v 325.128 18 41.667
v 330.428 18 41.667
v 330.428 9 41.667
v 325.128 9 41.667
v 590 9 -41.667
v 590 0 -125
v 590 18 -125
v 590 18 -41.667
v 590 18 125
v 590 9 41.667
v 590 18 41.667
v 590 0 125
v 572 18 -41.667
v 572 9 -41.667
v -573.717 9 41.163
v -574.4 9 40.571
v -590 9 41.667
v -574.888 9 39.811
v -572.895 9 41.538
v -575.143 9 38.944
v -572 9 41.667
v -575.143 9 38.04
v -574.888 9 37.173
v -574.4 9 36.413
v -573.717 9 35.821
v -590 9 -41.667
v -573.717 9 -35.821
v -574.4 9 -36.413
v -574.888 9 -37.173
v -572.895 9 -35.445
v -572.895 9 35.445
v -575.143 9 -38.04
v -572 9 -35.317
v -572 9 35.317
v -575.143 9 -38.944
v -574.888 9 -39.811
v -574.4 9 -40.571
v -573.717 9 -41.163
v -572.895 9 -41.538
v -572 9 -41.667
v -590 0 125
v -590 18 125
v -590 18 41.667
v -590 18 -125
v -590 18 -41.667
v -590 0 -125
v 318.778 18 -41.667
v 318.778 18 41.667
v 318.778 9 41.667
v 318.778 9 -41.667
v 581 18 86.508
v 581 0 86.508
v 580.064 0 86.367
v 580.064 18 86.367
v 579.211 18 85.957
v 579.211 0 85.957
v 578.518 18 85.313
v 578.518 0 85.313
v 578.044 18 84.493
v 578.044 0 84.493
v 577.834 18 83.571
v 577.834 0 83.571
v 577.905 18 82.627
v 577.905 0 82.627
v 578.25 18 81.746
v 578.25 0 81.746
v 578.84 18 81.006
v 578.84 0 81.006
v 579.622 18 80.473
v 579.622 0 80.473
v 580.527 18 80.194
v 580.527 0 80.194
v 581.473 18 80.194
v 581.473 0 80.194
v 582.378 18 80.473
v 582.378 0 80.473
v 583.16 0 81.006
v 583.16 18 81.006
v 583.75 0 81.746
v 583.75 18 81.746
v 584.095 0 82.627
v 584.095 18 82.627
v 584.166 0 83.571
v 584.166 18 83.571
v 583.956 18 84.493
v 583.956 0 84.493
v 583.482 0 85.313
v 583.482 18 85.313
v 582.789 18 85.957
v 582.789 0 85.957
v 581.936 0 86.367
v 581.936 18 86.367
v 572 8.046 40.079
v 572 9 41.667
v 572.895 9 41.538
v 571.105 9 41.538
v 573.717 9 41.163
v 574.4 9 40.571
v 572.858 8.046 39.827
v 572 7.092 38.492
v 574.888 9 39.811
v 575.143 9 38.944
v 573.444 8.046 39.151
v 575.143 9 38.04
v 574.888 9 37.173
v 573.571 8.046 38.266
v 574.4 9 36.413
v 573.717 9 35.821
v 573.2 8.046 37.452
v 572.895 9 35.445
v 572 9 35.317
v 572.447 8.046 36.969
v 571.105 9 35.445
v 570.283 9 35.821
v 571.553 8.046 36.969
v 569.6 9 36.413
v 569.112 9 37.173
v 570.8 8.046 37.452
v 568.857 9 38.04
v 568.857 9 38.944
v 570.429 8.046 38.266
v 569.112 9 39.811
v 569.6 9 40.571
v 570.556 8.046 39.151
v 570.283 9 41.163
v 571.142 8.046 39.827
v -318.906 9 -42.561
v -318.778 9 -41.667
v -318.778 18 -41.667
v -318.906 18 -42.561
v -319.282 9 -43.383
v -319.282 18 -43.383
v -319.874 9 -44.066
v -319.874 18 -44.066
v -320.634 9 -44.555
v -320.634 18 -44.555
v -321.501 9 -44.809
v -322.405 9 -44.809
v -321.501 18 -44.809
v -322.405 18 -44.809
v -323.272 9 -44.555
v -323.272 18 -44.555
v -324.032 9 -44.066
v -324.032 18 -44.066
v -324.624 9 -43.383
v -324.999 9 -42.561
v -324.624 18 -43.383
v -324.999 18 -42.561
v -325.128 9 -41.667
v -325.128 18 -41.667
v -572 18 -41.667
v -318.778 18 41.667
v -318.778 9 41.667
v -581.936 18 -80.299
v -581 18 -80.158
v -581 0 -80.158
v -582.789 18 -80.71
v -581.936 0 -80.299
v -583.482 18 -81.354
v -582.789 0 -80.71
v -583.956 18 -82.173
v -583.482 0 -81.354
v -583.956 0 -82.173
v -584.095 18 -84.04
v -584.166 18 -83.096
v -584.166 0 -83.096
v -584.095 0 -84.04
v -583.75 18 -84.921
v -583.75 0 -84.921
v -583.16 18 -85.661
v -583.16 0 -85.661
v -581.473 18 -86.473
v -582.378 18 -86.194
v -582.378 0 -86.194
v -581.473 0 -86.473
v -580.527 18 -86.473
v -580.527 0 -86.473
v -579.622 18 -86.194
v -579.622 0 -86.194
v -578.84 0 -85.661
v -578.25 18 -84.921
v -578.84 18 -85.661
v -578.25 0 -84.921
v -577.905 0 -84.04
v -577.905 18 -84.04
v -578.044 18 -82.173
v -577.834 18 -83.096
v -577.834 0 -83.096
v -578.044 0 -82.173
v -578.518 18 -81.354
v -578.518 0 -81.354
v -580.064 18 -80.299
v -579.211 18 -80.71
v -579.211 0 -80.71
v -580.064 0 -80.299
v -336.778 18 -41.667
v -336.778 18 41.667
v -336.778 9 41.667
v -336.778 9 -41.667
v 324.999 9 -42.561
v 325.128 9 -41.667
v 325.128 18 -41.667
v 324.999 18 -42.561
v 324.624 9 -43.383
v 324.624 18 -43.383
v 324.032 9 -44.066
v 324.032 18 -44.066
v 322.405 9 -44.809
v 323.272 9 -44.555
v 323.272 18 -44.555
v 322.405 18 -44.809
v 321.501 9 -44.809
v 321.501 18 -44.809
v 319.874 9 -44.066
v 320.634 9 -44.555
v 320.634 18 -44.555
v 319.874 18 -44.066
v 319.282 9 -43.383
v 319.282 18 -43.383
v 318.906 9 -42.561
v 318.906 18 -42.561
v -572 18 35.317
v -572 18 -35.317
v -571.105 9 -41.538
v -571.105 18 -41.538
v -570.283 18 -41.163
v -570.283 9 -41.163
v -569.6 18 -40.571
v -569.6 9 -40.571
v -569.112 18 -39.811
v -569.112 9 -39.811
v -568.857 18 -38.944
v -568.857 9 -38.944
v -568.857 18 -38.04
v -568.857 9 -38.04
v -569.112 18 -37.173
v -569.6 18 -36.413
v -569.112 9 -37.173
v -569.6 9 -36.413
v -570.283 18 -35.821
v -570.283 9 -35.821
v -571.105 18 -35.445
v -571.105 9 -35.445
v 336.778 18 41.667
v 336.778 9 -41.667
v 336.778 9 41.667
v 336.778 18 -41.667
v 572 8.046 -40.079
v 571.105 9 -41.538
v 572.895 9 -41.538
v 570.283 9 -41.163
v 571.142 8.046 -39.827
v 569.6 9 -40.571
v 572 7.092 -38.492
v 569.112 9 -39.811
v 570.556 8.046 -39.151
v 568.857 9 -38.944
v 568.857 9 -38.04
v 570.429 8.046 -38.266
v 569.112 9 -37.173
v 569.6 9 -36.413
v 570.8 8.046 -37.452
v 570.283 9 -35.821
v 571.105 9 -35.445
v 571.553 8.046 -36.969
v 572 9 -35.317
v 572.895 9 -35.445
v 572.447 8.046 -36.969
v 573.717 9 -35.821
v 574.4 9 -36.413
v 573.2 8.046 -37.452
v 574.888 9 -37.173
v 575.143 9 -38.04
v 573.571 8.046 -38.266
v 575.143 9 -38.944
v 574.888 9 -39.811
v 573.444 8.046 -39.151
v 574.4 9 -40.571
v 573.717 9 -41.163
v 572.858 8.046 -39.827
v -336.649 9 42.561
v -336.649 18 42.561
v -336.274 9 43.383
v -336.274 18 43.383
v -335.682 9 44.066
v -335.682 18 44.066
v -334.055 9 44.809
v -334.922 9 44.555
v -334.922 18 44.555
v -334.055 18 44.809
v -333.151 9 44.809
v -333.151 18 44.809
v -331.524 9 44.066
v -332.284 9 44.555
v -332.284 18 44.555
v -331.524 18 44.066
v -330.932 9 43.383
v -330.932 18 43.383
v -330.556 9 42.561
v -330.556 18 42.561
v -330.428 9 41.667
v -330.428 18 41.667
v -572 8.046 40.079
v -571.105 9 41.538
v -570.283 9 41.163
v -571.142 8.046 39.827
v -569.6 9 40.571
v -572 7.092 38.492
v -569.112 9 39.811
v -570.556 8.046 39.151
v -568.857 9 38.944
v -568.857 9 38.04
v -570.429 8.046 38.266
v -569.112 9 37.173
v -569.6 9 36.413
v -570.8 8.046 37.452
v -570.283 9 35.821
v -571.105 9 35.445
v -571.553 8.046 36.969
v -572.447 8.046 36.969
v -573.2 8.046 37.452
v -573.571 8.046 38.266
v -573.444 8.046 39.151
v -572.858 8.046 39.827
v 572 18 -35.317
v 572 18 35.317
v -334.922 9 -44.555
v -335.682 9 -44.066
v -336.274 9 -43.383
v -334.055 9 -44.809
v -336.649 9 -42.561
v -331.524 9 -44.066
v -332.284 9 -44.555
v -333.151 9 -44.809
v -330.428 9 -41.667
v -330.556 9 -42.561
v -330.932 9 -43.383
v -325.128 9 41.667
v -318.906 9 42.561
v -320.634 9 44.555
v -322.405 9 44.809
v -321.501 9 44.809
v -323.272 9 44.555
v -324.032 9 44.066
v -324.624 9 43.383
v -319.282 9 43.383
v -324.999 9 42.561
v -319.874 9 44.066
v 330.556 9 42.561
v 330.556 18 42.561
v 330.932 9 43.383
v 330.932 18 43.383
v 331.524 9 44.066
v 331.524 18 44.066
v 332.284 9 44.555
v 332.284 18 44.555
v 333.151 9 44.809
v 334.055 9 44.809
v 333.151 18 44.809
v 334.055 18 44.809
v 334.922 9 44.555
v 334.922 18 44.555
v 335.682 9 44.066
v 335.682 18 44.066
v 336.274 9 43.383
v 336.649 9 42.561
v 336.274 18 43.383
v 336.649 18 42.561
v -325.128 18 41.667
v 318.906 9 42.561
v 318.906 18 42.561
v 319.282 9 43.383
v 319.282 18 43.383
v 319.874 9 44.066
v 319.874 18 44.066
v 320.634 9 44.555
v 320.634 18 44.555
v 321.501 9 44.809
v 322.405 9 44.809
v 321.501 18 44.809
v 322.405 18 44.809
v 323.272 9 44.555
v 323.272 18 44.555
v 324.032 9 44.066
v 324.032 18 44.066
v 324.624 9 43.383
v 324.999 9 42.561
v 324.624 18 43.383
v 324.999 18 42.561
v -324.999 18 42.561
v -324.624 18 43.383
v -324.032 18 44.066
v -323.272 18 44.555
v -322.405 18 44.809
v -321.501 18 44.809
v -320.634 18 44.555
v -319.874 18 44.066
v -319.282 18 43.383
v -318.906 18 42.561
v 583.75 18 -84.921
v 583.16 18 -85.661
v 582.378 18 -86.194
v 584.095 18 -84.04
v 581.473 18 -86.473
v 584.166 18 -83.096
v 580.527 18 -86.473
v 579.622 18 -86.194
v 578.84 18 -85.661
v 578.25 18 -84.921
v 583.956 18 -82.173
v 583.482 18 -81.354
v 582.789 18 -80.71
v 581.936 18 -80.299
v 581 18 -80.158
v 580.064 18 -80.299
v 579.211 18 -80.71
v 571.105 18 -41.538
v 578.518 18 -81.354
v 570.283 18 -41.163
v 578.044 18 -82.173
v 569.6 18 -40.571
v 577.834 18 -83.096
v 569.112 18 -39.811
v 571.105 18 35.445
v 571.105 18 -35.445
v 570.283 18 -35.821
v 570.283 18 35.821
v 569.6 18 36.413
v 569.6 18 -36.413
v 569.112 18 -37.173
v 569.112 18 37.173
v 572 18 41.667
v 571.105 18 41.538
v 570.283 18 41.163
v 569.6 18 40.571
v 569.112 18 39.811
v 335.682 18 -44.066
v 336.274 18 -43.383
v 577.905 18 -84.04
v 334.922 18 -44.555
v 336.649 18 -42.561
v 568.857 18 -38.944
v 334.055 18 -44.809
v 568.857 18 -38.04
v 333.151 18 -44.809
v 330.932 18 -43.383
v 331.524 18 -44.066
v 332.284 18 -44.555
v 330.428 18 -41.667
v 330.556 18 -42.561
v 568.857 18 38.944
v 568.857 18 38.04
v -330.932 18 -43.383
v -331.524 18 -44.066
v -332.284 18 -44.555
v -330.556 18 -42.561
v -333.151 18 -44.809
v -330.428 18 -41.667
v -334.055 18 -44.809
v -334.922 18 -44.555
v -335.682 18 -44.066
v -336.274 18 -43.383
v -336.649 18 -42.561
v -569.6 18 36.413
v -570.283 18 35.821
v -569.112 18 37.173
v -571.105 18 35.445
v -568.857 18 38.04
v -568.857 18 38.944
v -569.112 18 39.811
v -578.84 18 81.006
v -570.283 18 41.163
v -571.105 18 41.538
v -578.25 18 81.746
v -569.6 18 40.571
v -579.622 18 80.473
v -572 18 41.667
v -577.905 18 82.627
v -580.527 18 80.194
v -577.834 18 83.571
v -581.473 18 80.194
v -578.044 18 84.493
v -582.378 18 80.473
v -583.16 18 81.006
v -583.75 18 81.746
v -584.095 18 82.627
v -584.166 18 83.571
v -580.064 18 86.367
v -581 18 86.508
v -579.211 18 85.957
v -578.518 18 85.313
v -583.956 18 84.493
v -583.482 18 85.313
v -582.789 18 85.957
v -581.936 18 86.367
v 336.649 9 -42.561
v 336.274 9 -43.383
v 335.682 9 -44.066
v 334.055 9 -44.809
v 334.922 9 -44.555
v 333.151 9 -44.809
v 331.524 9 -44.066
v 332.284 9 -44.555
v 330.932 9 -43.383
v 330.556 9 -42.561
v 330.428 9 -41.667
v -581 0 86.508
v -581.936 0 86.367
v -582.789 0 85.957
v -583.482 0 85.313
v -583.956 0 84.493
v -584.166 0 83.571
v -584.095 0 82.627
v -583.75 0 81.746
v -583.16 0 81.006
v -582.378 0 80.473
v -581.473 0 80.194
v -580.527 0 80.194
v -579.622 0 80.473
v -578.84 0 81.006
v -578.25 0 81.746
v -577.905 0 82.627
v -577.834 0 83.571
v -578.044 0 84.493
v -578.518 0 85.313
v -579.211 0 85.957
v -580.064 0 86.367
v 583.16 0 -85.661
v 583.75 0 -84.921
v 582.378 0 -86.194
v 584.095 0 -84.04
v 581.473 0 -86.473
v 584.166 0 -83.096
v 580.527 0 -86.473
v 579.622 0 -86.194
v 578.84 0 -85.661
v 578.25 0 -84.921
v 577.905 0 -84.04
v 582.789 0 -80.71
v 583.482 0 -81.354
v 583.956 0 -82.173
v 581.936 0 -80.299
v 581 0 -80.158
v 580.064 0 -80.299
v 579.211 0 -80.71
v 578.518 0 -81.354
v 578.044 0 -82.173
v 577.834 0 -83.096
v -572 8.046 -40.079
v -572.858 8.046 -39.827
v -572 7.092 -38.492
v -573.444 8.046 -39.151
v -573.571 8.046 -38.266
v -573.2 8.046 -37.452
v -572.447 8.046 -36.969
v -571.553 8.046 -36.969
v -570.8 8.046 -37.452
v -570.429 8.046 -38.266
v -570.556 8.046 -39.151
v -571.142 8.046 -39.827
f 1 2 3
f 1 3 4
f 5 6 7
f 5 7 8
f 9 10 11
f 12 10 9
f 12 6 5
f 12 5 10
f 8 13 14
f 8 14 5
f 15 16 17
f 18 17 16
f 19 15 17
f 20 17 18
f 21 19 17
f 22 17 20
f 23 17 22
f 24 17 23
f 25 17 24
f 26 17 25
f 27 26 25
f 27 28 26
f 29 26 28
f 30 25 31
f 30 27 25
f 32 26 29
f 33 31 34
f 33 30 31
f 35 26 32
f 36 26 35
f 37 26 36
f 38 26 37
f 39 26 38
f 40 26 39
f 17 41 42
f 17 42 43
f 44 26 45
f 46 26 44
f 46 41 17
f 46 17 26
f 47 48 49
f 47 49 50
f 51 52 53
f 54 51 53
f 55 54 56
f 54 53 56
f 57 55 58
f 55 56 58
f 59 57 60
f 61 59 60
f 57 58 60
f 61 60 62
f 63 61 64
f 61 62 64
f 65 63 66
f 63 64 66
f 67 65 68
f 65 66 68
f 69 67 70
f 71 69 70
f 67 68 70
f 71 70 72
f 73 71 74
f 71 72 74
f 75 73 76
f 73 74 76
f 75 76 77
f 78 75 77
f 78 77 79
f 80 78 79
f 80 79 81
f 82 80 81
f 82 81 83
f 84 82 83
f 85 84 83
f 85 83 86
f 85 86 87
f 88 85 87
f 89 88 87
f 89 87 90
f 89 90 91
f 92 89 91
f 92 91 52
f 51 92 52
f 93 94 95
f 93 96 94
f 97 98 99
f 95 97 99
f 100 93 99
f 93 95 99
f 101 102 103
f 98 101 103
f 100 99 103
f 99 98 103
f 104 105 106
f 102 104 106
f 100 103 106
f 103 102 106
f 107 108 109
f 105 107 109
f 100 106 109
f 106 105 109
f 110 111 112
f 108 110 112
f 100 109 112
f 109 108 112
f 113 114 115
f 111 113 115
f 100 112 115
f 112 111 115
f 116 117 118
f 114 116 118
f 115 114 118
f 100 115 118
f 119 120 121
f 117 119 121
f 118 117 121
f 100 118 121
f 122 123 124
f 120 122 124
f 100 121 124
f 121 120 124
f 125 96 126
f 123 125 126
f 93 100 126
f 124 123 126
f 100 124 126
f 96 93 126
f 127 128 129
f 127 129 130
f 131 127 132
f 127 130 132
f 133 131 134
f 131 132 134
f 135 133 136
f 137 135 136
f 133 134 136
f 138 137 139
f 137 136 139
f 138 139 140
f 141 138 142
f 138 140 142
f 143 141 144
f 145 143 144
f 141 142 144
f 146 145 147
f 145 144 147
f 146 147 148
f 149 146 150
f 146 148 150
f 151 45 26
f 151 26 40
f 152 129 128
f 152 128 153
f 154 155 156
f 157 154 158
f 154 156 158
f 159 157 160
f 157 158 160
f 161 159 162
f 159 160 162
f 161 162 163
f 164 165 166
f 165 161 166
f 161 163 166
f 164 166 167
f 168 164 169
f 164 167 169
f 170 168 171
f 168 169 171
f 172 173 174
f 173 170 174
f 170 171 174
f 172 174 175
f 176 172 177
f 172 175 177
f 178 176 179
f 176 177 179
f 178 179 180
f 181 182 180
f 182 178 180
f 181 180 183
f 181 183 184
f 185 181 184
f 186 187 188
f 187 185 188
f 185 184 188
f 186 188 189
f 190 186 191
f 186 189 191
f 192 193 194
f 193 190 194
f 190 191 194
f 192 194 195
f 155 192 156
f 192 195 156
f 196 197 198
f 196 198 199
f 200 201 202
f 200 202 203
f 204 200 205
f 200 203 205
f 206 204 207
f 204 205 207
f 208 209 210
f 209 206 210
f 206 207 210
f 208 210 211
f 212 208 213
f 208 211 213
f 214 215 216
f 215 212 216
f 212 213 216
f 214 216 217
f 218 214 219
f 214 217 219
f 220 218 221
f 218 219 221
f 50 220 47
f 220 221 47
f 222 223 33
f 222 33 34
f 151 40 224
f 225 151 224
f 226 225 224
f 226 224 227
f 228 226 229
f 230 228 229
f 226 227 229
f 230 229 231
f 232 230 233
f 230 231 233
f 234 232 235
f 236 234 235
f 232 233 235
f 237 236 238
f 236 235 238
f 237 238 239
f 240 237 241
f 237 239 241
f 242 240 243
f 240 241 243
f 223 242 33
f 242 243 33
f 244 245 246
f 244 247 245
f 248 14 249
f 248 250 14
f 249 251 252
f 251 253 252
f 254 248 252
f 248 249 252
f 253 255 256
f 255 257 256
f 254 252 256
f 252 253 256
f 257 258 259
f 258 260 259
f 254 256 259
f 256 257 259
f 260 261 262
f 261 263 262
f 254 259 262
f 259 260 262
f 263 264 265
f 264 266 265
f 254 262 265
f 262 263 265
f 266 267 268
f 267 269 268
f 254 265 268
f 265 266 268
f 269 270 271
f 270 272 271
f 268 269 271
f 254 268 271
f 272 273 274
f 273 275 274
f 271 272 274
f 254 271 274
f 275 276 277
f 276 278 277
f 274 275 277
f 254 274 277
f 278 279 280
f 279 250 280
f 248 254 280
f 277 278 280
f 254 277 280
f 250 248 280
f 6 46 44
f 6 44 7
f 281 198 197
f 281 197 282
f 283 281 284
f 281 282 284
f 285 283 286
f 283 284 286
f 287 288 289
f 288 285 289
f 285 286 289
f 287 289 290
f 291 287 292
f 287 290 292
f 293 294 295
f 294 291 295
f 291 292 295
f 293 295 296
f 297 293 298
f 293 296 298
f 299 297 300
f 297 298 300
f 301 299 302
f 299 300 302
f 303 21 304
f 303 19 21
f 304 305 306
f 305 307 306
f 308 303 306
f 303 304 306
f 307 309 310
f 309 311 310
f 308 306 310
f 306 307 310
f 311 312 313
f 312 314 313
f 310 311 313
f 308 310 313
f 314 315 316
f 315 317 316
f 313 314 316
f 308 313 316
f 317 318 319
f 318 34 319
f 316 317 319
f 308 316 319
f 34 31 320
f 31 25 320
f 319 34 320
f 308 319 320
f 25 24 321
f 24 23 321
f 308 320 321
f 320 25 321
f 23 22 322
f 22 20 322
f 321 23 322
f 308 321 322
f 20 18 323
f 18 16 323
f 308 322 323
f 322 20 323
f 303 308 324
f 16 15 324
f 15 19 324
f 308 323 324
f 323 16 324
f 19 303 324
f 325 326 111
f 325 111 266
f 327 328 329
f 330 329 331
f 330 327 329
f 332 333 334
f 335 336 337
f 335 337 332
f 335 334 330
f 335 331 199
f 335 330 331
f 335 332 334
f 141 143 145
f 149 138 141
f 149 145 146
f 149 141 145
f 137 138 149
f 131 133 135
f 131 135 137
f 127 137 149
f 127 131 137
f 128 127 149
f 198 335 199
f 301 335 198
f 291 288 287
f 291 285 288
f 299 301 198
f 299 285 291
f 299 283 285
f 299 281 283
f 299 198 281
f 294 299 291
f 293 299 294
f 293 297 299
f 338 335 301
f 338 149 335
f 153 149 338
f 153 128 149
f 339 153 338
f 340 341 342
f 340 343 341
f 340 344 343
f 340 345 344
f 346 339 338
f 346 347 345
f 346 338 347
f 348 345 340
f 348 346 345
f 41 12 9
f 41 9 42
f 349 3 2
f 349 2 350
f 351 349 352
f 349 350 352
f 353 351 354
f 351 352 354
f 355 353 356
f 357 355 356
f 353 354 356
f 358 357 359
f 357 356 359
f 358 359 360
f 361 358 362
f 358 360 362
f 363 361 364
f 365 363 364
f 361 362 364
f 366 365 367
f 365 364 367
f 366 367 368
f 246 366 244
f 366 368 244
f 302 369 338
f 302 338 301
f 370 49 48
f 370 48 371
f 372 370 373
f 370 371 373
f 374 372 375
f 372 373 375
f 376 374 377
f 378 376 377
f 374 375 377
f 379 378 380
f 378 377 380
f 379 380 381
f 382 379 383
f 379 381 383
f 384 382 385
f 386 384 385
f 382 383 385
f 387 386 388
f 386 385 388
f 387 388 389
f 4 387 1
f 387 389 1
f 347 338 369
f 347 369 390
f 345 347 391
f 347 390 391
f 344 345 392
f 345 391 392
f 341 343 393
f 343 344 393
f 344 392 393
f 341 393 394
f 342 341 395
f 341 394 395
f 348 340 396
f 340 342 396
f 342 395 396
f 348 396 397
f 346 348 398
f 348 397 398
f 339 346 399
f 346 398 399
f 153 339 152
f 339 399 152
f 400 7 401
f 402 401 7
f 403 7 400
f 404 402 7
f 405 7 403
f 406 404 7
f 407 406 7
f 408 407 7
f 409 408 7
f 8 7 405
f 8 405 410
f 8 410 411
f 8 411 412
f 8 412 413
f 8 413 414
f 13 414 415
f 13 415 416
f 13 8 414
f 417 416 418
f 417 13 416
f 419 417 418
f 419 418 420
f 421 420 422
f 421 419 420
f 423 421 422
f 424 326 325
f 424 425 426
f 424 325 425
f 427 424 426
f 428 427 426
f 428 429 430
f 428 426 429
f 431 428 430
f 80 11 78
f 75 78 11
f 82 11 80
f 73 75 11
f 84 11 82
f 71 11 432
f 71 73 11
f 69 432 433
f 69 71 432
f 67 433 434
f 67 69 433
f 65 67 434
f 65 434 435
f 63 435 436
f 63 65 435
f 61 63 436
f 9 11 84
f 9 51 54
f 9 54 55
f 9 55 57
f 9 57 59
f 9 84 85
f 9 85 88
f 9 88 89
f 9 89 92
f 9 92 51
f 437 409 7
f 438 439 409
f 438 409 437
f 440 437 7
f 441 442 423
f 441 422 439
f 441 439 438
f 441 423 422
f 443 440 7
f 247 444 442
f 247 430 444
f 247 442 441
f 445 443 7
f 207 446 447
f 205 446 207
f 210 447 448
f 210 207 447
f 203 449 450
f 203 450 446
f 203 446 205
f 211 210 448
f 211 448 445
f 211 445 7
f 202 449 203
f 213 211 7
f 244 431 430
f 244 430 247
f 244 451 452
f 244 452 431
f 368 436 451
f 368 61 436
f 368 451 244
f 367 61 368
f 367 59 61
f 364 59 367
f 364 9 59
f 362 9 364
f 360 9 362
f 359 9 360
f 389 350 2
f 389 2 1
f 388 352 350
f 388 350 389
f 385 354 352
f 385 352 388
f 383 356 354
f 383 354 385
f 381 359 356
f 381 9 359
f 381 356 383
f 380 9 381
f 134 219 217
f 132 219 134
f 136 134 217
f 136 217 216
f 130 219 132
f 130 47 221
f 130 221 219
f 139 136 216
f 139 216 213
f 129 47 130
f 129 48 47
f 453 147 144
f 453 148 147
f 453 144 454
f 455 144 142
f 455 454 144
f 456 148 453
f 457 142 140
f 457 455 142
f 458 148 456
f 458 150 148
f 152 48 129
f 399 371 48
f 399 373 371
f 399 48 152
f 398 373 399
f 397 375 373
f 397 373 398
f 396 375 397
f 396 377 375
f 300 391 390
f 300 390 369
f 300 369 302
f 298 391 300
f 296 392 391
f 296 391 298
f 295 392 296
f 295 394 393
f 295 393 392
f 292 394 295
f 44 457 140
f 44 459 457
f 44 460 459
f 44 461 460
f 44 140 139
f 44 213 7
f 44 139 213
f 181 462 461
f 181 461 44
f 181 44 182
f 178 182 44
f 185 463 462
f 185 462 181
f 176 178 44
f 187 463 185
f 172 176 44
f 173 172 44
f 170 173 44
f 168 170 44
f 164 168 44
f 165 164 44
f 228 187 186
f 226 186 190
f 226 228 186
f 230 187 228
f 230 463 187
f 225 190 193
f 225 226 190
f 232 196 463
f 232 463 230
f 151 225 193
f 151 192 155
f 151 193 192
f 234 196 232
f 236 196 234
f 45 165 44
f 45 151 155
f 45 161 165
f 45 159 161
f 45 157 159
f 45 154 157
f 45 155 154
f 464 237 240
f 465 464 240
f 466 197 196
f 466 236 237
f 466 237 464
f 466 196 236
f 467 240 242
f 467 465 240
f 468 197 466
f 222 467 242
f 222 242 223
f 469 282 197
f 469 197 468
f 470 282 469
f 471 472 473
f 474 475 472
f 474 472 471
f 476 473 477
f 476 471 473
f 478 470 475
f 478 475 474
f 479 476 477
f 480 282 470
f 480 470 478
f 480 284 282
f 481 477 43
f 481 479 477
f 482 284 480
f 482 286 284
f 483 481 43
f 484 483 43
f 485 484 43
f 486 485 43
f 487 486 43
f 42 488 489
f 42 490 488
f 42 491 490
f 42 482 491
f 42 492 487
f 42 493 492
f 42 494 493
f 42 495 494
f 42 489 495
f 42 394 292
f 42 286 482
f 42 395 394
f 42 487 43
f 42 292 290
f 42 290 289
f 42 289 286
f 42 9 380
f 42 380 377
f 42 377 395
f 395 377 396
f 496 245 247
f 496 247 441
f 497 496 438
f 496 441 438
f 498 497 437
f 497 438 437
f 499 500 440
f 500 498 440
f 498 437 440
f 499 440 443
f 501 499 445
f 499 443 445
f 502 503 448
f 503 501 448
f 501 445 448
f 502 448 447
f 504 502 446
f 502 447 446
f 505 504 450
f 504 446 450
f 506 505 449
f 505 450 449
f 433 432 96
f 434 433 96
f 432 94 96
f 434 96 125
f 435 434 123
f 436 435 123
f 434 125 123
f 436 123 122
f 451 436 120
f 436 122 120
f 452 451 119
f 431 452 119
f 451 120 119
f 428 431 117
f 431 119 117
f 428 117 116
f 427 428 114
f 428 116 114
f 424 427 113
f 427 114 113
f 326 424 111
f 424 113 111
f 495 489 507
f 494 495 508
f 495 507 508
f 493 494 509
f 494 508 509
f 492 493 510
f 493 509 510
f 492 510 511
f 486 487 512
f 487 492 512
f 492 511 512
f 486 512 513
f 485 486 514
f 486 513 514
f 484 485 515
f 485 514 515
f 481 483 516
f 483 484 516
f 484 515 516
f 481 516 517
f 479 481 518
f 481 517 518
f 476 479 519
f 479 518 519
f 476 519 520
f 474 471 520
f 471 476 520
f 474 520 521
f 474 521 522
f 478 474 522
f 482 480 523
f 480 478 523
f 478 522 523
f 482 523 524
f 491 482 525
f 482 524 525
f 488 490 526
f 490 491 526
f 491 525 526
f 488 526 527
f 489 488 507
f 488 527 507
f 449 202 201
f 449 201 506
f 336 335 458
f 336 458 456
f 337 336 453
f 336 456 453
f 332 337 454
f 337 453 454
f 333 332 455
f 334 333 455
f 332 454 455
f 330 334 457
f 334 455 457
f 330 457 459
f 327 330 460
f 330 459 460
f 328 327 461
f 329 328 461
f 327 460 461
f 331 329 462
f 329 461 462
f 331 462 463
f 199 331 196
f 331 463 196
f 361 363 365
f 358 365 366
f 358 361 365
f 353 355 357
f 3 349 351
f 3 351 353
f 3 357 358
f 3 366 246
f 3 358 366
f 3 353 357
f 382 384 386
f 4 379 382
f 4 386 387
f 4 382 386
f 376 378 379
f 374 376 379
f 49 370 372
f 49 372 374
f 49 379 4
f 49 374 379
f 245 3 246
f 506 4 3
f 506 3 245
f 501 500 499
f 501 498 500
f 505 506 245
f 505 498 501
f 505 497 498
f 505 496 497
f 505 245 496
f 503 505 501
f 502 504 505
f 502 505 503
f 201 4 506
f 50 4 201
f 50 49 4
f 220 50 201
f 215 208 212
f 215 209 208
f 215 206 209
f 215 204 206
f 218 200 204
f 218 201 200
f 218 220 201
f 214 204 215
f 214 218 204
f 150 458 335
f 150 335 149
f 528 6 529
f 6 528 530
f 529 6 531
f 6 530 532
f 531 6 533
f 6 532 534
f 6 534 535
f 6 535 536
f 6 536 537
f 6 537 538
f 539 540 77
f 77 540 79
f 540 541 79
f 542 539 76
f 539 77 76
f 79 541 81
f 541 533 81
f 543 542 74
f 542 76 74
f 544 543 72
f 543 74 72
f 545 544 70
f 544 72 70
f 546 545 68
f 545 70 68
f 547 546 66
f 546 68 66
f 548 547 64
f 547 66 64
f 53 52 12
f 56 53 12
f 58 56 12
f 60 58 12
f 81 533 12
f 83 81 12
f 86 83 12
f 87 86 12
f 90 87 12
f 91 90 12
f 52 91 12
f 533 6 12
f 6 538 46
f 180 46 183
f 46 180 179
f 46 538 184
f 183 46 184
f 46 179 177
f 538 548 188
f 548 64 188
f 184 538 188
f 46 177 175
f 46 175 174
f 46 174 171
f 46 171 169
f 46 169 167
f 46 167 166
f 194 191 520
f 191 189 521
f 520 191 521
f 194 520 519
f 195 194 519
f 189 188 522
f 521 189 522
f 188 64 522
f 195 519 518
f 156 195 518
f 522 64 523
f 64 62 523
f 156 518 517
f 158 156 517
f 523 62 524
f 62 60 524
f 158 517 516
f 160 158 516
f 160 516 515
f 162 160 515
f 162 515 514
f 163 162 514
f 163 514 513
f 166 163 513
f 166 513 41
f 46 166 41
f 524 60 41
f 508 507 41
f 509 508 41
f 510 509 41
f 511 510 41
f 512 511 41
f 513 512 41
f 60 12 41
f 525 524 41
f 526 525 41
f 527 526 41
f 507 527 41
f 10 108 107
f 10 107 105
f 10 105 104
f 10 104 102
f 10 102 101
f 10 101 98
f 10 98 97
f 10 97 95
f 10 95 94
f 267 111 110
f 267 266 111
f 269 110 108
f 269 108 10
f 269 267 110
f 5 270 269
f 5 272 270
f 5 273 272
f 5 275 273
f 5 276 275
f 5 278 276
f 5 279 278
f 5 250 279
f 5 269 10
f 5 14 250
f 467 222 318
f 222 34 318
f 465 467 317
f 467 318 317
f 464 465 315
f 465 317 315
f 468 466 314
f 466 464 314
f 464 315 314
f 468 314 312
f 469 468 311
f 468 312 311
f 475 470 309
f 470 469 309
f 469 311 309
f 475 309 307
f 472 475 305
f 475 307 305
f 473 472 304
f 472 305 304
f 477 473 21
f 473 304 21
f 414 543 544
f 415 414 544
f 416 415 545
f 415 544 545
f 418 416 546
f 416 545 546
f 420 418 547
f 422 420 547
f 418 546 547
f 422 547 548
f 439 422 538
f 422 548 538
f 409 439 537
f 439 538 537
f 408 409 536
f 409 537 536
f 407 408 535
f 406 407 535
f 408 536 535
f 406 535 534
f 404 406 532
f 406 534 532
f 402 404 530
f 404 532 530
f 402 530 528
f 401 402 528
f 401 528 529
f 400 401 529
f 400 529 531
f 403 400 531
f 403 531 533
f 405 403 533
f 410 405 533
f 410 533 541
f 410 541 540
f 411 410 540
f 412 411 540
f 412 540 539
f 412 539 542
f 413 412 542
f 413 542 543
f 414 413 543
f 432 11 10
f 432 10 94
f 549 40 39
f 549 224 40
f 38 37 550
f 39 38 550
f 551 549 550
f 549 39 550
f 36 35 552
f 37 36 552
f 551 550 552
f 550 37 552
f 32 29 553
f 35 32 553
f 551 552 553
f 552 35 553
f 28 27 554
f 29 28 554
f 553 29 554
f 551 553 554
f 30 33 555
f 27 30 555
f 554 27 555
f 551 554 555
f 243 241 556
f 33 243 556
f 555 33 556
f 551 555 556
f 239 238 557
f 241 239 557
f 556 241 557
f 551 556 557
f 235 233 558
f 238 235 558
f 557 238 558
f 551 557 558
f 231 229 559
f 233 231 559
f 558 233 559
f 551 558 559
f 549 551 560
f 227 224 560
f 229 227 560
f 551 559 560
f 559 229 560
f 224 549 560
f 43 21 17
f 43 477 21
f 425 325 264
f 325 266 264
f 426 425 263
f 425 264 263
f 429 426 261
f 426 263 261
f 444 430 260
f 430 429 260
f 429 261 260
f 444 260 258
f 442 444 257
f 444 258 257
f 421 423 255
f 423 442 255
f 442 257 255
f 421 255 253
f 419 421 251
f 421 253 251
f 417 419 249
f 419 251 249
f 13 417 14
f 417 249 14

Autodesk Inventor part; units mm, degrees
ref_plane "YZ Plane" through (0, 0, 0) normal (1, 0, 0) x (0, 1, 0)
sketch "Sketch1" plane through (0, 0, 0) normal (0, 1, 0) x (-1, 0, 0)
  line L0 (590, -125) -> (-590, -125)
  line L1 (-590, -125) -> (-590, 125)
  line L2 (-590, 125) -> (590, 125)
  line L3 (590, 125) -> (590, -125)
  point P0 (0, 0)
  point P1 (0, 125)
  point P2 (-590, 0)
  dimension "d0" = 250
  dimension "d1" = 1180
extrude "Extrusion1" add sketch "Sketch1" along normal blind 18
sketch "Sketch2" plane through (0, 18, 0) normal (0, 1, 0) x (1, 0, 0)
  line L0 (590, 125) -> (-590, 125) projected
  line L1 (-590, 125) -> (-590, -125) projected
  line L2 (-590, -125) -> (590, -125) projected
  line L3 (590, -125) -> (590, 125) projected
  line L4 (-590, 41.6667) -> (-572, 41.6667)
  line L5 (-572, 41.6667) -> (-572, -41.6667)
  line L6 (-572, -41.6667) -> (-590, -41.6667)
  line L7 (-590, -41.6667) -> (-590, 41.6667)
  line L8 (-590, 125) -> (-590, -125) projected
  point P0 (0, 0)
  point P1 (-572, 0)
  point P2 (-590, 0)
  point P3 (-590, 0)
  point P4 (-590, 0)
  dimension "d4" = 18
  dimension "d5" = 83.3333
extrude "Extrusion2" cut sketch "Sketch2" against normal blind 9 contours L4 L5 L6 L1
ref_plane "Work Plane1" through (0, 0, 125) normal (-1, 0, 0) x (0, 0, 1)
mirror "Mirror1" about plane through (0, 0, 125) normal (-1, 0, 0) of "Extrusion2"
sketch "Sketch3" plane through (0, 18, 0) normal (0, 1, 0) x (1, 0, 0)
  line L0 (590, -41.6667) -> (572, -41.6667) projected
  line L1 (572, -41.6667) -> (572, 41.6667) projected
  line L2 (572, 41.6667) -> (590, 41.6667) projected
  line L3 (590, 41.6667) -> (590, 125) projected
  line L4 (590, 125) -> (-590, 125) projected
  line L5 (-590, 125) -> (-590, 41.6667) projected
  line L6 (-590, 41.6667) -> (-572, 41.6667) projected
  line L7 (-572, 41.6667) -> (-572, -41.6667) projected
  line L8 (-572, -41.6667) -> (-590, -41.6667) projected
  line L9 (-590, -41.6667) -> (-590, -125) projected
  line L10 (-590, -125) -> (590, -125) projected
  line L11 (590, -125) -> (590, -41.6667) projected
  line L12 (-336.7778, 41.6667) -> (-318.7778, 41.6667)
  line L13 (-318.7778, 41.6667) -> (-318.7778, -41.6667)
  line L14 (-318.7778, -41.6667) -> (-336.7778, -41.6667)
  line L15 (-336.7778, -41.6667) -> (-336.7778, 41.6667)
  line L16 (-318.7778, 41.6667) -> (-327.7778, 41.6667) construction
  point P0 (0, 0)
  point P1 (-318.7778, 0)
  point P2 (-572, 0)
  point P3 (-323.2778, 41.6667)
  point P4 (-327.7778, 41.6667)
  dimension "d9" = 18
  dimension "d10" = 83.3333
  dimension "d11" = 83.3333
  dimension "d15" = 9
  dimension "d16" = 262.2222
extrude "Extrusion3" cut sketch "Sketch3" against normal blind 9 contours L12 L13 L14 L15
mirror "Mirror2" about plane through (0, 0, 125) normal (-1, 0, 0) of "Extrusion3"
sketch "Sketch4" plane through (0, 18, 0) normal (0, 1, 0) x (1, 0, 0)
  line L0 (336.7778, 41.6667) -> (336.7778, -41.6667) projected
  line L1 (336.7778, -41.6667) -> (318.7778, -41.6667) projected
  line L2 (318.7778, -41.6667) -> (318.7778, 41.6667) projected
  line L3 (318.7778, 41.6667) -> (336.7778, 41.6667) projected
  line L4 (-336.7778, -41.6667) -> (-336.7778, 41.6667) projected
  line L5 (-336.7778, 41.6667) -> (-318.7778, 41.6667) projected
  line L6 (-318.7778, 41.6667) -> (-318.7778, -41.6667) projected
  line L7 (-318.7778, -41.6667) -> (-336.7778, -41.6667) projected
  line L8 (590, -41.6667) -> (572, -41.6667) projected
  line L9 (572, -41.6667) -> (572, 41.6667) projected
  line L10 (572, 41.6667) -> (590, 41.6667) projected
  line L11 (590, 41.6667) -> (590, 125) projected
  line L12 (590, 125) -> (-590, 125) projected
  line L13 (-590, 125) -> (-590, 41.6667) projected
  line L14 (-590, 41.6667) -> (-572, 41.6667) projected
  line L15 (-572, 41.6667) -> (-572, -41.6667) projected
  line L16 (-572, -41.6667) -> (-590, -41.6667) projected
  line L17 (-590, -41.6667) -> (-590, -125) projected
  line L18 (-590, -125) -> (590, -125) projected
  line L19 (590, -125) -> (590, -41.6667) projected
  point P0 (0, 0)
  point P1 (572, -38.4917)
  dimension "d17" = 3.175
hole "Hole1" at (572, 18, 38.4917) direction (0, -1, 0) diameter 6.35 depth 9 tip angle 118
ref_plane "Work Plane2" through (590, 9, 0) normal (0, 0, -1) x (-1, 0, 0)
mirror "Mirror3" about plane through (590, 9, 0) normal (0, 0, -1) of "Hole1"
mirror "Mirror4" about plane through (0, 0, 125) normal (-1, 0, 0) of "Hole1", "Mirror3"
sketch "Sketch5" plane through (318.7778, 9, -41.6667) normal (0, 1, 0) x (1, 0, 0)
  line L0 (18, 0) -> (18, -83.3333) projected
  line L1 (18, -83.3333) -> (0, -83.3333) projected
  line L2 (0, -83.3333) -> (0, 0) projected
  line L3 (0, 0) -> (18, 0) projected
  line L4 (-655.5556, -83.3333) -> (-655.5556, 0) projected
  line L5 (-655.5556, 0) -> (-637.5556, 0) projected
  line L6 (-637.5556, 0) -> (-637.5556, -83.3333) projected
  line L7 (-637.5556, -83.3333) -> (-655.5556, -83.3333) projected
  arc A0 (-890.7778, -6.35) -> (-890.7778, 0) centre (-890.7778, -3.175) ccw projected
  line L8 (-890.7778, -6.35) -> (-890.7778, -76.9833) projected
  arc A1 (-890.7778, -83.3333) -> (-890.7778, -76.9833) centre (-890.7778, -80.1583) ccw projected
  line L9 (-890.7778, -83.3333) -> (-908.7778, -83.3333) projected
  line L10 (-908.7778, -83.3333) -> (-908.7778, -166.6667) projected
  line L11 (-908.7778, -166.6667) -> (271.2222, -166.6667) projected
  line L12 (271.2222, -166.6667) -> (271.2222, -83.3333) projected
  line L13 (271.2222, -83.3333) -> (253.2222, -83.3333) projected
  arc A2 (253.2222, -76.9833) -> (253.2222, -83.3333) centre (253.2222, -80.1583) ccw projected
  line L14 (253.2222, -76.9833) -> (253.2222, -6.35) projected
  arc A3 (253.2222, 0) -> (253.2222, -6.35) centre (253.2222, -3.175) ccw projected
  line L15 (253.2222, 0) -> (271.2222, 0) projected
  line L16 (271.2222, 0) -> (271.2222, 83.3333) projected
  line L17 (271.2222, 83.3333) -> (-908.7778, 83.3333) projected
  line L18 (-908.7778, 83.3333) -> (-908.7778, 0) projected
  line L19 (-908.7778, 0) -> (-890.7778, 0) projected
  point P0 (-318.7778, -41.6667)
  point P1 (14.825, -83.3333)
  point P2 (3.175, -83.3333)
  dimension "d25" = 3.175
  dimension "d26" = 3.175
hole "Hole2" at (333.6028, 9, 41.6667) at (321.9528, 9, 41.6667) direction (0, 1, 0) diameter 6.35 depth 9 tip angle 118
mirror "Mirror5" about plane through (590, 9, 0) normal (0, 0, -1) of "Hole2"
mirror "Mirror6" about plane through (0, 0, 125) normal (-1, 0, 0) of "Hole2", "Mirror5"
sketch "Sketch7" plane through (0, 18, 0) normal (0, 1, 0) x (1, 0, 0)
  arc A0 (336.7778, 41.6667) -> (330.4278, 41.6667) centre (333.6028, 41.6667) ccw projected
  line L0 (336.7778, 41.6667) -> (336.7778, -41.6667) projected
  arc A1 (330.4278, -41.6667) -> (336.7778, -41.6667) centre (333.6028, -41.6667) ccw projected
  line L1 (330.4278, -41.6667) -> (325.1278, -41.6667) projected
  arc A2 (318.7778, -41.6667) -> (325.1278, -41.6667) centre (321.9528, -41.6667) ccw projected
  line L2 (318.7778, -41.6667) -> (318.7778, 41.6667) projected
  arc A3 (325.1278, 41.6667) -> (318.7778, 41.6667) centre (321.9528, 41.6667) ccw projected
  line L3 (325.1278, 41.6667) -> (330.4278, 41.6667) projected
  arc A4 (-572, 35.3167) -> (-572, 41.6667) centre (-572, 38.4917) ccw projected
  line L4 (-572, 35.3167) -> (-572, -35.3167) projected
  arc A5 (-572, -41.6667) -> (-572, -35.3167) centre (-572, -38.4917) ccw projected
  line L5 (-572, -41.6667) -> (-590, -41.6667) projected
  line L6 (-590, -41.6667) -> (-590, -125) projected
  line L7 (-590, -125) -> (590, -125) projected
  line L8 (590, -125) -> (590, -41.6667) projected
  line L9 (590, -41.6667) -> (572, -41.6667) projected
  arc A6 (572, -35.3167) -> (572, -41.6667) centre (572, -38.4917) ccw projected
  line L10 (572, -35.3167) -> (572, 35.3167) projected
  arc A7 (572, 41.6667) -> (572, 35.3167) centre (572, 38.4917) ccw projected
  line L11 (572, 41.6667) -> (590, 41.6667) projected
  line L12 (590, 41.6667) -> (590, 125) projected
  line L13 (590, 125) -> (-590, 125) projected
  line L14 (-590, 125) -> (-590, 41.6667) projected
  line L15 (-590, 41.6667) -> (-572, 41.6667) projected
  arc A8 (-330.4278, 41.6667) -> (-336.7778, 41.6667) centre (-333.6028, 41.6667) ccw projected
  line L16 (-330.4278, 41.6667) -> (-325.1278, 41.6667) projected
  arc A9 (-318.7778, 41.6667) -> (-325.1278, 41.6667) centre (-321.9528, 41.6667) ccw projected
  line L17 (-318.7778, 41.6667) -> (-318.7778, -41.6667) projected
  arc A10 (-325.1278, -41.6667) -> (-318.7778, -41.6667) centre (-321.9528, -41.6667) ccw projected
  line L18 (-325.1278, -41.6667) -> (-330.4278, -41.6667) projected
  arc A11 (-336.7778, -41.6667) -> (-330.4278, -41.6667) centre (-333.6028, -41.6667) ccw projected
  line L19 (-336.7778, -41.6667) -> (-336.7778, 41.6667) projected
  point P0 (0, 0)
  point P1 (581, -83.3333)
  point P2 (581, 83.3333)
  point P3 (590, 83.3333)
  point P4 (590, -83.3333)
  dimension "d34" = 9
  dimension "d35" = 9
hole "Hole3" at (581, 18, 83.3333) at (581, 18, -83.3333) direction (0, -1, 0) diameter 6.35 end through all
mirror "Mirror7" about plane through (0, 0, 125) normal (-1, 0, 0) of "Hole3"
equation "\"d0\" = shelfWidth"
equation "\"d1\" = shelfLength"
equation "\"d2\" = plyThickness"
equation "\"d4\" = plyThickness"
equation "\"d5\" = 0.333333 * shelfWidth"
equation "\"d7\" = 0.5 * plyThickness"
equation "\"d9\" = plyThickness"
equation "\"d10\" = 0.333333 * shelfWidth"
equation "\"d15\" = 0.5 * plyThickness"
equation "\"d16\" = 0.222222 * shelfLength"
equation "\"d13\" = 0.5 * plyThickness"
equation "\"d17\" = 0.5 * millDiameter"
equation "\"d18\" = millDiameter"
equation "\"d23\" = 0.5 * plyThickness"
equation "\"d25\" = 0.5 * millDiameter"
equation "\"d26\" = 0.5 * millDiameter"
equation "\"d27\" = millDiameter"
equation "\"d32\" = 0.5 * plyThickness"
equation "\"d34\" = 0.5 * plyThickness"
equation "\"d35\" = 0.5 * plyThickness"
equation "\"d36\" = millDiameter"
equation "\"d41\" = 0.5 * plyThickness"
equation "\"plyThickness\" = 18"
equation "\"legHeight\" = 702"
equation "\"millDiameter\" = 6.35"
equation "\"legTopTabHeight\" = 18"
equation "\"legTopSlotDepth\" = 49"
equation "\"shelfLength\" = 1180"
equation "\"shelfWidth\" = 250"
properties part number "shelfTop"
